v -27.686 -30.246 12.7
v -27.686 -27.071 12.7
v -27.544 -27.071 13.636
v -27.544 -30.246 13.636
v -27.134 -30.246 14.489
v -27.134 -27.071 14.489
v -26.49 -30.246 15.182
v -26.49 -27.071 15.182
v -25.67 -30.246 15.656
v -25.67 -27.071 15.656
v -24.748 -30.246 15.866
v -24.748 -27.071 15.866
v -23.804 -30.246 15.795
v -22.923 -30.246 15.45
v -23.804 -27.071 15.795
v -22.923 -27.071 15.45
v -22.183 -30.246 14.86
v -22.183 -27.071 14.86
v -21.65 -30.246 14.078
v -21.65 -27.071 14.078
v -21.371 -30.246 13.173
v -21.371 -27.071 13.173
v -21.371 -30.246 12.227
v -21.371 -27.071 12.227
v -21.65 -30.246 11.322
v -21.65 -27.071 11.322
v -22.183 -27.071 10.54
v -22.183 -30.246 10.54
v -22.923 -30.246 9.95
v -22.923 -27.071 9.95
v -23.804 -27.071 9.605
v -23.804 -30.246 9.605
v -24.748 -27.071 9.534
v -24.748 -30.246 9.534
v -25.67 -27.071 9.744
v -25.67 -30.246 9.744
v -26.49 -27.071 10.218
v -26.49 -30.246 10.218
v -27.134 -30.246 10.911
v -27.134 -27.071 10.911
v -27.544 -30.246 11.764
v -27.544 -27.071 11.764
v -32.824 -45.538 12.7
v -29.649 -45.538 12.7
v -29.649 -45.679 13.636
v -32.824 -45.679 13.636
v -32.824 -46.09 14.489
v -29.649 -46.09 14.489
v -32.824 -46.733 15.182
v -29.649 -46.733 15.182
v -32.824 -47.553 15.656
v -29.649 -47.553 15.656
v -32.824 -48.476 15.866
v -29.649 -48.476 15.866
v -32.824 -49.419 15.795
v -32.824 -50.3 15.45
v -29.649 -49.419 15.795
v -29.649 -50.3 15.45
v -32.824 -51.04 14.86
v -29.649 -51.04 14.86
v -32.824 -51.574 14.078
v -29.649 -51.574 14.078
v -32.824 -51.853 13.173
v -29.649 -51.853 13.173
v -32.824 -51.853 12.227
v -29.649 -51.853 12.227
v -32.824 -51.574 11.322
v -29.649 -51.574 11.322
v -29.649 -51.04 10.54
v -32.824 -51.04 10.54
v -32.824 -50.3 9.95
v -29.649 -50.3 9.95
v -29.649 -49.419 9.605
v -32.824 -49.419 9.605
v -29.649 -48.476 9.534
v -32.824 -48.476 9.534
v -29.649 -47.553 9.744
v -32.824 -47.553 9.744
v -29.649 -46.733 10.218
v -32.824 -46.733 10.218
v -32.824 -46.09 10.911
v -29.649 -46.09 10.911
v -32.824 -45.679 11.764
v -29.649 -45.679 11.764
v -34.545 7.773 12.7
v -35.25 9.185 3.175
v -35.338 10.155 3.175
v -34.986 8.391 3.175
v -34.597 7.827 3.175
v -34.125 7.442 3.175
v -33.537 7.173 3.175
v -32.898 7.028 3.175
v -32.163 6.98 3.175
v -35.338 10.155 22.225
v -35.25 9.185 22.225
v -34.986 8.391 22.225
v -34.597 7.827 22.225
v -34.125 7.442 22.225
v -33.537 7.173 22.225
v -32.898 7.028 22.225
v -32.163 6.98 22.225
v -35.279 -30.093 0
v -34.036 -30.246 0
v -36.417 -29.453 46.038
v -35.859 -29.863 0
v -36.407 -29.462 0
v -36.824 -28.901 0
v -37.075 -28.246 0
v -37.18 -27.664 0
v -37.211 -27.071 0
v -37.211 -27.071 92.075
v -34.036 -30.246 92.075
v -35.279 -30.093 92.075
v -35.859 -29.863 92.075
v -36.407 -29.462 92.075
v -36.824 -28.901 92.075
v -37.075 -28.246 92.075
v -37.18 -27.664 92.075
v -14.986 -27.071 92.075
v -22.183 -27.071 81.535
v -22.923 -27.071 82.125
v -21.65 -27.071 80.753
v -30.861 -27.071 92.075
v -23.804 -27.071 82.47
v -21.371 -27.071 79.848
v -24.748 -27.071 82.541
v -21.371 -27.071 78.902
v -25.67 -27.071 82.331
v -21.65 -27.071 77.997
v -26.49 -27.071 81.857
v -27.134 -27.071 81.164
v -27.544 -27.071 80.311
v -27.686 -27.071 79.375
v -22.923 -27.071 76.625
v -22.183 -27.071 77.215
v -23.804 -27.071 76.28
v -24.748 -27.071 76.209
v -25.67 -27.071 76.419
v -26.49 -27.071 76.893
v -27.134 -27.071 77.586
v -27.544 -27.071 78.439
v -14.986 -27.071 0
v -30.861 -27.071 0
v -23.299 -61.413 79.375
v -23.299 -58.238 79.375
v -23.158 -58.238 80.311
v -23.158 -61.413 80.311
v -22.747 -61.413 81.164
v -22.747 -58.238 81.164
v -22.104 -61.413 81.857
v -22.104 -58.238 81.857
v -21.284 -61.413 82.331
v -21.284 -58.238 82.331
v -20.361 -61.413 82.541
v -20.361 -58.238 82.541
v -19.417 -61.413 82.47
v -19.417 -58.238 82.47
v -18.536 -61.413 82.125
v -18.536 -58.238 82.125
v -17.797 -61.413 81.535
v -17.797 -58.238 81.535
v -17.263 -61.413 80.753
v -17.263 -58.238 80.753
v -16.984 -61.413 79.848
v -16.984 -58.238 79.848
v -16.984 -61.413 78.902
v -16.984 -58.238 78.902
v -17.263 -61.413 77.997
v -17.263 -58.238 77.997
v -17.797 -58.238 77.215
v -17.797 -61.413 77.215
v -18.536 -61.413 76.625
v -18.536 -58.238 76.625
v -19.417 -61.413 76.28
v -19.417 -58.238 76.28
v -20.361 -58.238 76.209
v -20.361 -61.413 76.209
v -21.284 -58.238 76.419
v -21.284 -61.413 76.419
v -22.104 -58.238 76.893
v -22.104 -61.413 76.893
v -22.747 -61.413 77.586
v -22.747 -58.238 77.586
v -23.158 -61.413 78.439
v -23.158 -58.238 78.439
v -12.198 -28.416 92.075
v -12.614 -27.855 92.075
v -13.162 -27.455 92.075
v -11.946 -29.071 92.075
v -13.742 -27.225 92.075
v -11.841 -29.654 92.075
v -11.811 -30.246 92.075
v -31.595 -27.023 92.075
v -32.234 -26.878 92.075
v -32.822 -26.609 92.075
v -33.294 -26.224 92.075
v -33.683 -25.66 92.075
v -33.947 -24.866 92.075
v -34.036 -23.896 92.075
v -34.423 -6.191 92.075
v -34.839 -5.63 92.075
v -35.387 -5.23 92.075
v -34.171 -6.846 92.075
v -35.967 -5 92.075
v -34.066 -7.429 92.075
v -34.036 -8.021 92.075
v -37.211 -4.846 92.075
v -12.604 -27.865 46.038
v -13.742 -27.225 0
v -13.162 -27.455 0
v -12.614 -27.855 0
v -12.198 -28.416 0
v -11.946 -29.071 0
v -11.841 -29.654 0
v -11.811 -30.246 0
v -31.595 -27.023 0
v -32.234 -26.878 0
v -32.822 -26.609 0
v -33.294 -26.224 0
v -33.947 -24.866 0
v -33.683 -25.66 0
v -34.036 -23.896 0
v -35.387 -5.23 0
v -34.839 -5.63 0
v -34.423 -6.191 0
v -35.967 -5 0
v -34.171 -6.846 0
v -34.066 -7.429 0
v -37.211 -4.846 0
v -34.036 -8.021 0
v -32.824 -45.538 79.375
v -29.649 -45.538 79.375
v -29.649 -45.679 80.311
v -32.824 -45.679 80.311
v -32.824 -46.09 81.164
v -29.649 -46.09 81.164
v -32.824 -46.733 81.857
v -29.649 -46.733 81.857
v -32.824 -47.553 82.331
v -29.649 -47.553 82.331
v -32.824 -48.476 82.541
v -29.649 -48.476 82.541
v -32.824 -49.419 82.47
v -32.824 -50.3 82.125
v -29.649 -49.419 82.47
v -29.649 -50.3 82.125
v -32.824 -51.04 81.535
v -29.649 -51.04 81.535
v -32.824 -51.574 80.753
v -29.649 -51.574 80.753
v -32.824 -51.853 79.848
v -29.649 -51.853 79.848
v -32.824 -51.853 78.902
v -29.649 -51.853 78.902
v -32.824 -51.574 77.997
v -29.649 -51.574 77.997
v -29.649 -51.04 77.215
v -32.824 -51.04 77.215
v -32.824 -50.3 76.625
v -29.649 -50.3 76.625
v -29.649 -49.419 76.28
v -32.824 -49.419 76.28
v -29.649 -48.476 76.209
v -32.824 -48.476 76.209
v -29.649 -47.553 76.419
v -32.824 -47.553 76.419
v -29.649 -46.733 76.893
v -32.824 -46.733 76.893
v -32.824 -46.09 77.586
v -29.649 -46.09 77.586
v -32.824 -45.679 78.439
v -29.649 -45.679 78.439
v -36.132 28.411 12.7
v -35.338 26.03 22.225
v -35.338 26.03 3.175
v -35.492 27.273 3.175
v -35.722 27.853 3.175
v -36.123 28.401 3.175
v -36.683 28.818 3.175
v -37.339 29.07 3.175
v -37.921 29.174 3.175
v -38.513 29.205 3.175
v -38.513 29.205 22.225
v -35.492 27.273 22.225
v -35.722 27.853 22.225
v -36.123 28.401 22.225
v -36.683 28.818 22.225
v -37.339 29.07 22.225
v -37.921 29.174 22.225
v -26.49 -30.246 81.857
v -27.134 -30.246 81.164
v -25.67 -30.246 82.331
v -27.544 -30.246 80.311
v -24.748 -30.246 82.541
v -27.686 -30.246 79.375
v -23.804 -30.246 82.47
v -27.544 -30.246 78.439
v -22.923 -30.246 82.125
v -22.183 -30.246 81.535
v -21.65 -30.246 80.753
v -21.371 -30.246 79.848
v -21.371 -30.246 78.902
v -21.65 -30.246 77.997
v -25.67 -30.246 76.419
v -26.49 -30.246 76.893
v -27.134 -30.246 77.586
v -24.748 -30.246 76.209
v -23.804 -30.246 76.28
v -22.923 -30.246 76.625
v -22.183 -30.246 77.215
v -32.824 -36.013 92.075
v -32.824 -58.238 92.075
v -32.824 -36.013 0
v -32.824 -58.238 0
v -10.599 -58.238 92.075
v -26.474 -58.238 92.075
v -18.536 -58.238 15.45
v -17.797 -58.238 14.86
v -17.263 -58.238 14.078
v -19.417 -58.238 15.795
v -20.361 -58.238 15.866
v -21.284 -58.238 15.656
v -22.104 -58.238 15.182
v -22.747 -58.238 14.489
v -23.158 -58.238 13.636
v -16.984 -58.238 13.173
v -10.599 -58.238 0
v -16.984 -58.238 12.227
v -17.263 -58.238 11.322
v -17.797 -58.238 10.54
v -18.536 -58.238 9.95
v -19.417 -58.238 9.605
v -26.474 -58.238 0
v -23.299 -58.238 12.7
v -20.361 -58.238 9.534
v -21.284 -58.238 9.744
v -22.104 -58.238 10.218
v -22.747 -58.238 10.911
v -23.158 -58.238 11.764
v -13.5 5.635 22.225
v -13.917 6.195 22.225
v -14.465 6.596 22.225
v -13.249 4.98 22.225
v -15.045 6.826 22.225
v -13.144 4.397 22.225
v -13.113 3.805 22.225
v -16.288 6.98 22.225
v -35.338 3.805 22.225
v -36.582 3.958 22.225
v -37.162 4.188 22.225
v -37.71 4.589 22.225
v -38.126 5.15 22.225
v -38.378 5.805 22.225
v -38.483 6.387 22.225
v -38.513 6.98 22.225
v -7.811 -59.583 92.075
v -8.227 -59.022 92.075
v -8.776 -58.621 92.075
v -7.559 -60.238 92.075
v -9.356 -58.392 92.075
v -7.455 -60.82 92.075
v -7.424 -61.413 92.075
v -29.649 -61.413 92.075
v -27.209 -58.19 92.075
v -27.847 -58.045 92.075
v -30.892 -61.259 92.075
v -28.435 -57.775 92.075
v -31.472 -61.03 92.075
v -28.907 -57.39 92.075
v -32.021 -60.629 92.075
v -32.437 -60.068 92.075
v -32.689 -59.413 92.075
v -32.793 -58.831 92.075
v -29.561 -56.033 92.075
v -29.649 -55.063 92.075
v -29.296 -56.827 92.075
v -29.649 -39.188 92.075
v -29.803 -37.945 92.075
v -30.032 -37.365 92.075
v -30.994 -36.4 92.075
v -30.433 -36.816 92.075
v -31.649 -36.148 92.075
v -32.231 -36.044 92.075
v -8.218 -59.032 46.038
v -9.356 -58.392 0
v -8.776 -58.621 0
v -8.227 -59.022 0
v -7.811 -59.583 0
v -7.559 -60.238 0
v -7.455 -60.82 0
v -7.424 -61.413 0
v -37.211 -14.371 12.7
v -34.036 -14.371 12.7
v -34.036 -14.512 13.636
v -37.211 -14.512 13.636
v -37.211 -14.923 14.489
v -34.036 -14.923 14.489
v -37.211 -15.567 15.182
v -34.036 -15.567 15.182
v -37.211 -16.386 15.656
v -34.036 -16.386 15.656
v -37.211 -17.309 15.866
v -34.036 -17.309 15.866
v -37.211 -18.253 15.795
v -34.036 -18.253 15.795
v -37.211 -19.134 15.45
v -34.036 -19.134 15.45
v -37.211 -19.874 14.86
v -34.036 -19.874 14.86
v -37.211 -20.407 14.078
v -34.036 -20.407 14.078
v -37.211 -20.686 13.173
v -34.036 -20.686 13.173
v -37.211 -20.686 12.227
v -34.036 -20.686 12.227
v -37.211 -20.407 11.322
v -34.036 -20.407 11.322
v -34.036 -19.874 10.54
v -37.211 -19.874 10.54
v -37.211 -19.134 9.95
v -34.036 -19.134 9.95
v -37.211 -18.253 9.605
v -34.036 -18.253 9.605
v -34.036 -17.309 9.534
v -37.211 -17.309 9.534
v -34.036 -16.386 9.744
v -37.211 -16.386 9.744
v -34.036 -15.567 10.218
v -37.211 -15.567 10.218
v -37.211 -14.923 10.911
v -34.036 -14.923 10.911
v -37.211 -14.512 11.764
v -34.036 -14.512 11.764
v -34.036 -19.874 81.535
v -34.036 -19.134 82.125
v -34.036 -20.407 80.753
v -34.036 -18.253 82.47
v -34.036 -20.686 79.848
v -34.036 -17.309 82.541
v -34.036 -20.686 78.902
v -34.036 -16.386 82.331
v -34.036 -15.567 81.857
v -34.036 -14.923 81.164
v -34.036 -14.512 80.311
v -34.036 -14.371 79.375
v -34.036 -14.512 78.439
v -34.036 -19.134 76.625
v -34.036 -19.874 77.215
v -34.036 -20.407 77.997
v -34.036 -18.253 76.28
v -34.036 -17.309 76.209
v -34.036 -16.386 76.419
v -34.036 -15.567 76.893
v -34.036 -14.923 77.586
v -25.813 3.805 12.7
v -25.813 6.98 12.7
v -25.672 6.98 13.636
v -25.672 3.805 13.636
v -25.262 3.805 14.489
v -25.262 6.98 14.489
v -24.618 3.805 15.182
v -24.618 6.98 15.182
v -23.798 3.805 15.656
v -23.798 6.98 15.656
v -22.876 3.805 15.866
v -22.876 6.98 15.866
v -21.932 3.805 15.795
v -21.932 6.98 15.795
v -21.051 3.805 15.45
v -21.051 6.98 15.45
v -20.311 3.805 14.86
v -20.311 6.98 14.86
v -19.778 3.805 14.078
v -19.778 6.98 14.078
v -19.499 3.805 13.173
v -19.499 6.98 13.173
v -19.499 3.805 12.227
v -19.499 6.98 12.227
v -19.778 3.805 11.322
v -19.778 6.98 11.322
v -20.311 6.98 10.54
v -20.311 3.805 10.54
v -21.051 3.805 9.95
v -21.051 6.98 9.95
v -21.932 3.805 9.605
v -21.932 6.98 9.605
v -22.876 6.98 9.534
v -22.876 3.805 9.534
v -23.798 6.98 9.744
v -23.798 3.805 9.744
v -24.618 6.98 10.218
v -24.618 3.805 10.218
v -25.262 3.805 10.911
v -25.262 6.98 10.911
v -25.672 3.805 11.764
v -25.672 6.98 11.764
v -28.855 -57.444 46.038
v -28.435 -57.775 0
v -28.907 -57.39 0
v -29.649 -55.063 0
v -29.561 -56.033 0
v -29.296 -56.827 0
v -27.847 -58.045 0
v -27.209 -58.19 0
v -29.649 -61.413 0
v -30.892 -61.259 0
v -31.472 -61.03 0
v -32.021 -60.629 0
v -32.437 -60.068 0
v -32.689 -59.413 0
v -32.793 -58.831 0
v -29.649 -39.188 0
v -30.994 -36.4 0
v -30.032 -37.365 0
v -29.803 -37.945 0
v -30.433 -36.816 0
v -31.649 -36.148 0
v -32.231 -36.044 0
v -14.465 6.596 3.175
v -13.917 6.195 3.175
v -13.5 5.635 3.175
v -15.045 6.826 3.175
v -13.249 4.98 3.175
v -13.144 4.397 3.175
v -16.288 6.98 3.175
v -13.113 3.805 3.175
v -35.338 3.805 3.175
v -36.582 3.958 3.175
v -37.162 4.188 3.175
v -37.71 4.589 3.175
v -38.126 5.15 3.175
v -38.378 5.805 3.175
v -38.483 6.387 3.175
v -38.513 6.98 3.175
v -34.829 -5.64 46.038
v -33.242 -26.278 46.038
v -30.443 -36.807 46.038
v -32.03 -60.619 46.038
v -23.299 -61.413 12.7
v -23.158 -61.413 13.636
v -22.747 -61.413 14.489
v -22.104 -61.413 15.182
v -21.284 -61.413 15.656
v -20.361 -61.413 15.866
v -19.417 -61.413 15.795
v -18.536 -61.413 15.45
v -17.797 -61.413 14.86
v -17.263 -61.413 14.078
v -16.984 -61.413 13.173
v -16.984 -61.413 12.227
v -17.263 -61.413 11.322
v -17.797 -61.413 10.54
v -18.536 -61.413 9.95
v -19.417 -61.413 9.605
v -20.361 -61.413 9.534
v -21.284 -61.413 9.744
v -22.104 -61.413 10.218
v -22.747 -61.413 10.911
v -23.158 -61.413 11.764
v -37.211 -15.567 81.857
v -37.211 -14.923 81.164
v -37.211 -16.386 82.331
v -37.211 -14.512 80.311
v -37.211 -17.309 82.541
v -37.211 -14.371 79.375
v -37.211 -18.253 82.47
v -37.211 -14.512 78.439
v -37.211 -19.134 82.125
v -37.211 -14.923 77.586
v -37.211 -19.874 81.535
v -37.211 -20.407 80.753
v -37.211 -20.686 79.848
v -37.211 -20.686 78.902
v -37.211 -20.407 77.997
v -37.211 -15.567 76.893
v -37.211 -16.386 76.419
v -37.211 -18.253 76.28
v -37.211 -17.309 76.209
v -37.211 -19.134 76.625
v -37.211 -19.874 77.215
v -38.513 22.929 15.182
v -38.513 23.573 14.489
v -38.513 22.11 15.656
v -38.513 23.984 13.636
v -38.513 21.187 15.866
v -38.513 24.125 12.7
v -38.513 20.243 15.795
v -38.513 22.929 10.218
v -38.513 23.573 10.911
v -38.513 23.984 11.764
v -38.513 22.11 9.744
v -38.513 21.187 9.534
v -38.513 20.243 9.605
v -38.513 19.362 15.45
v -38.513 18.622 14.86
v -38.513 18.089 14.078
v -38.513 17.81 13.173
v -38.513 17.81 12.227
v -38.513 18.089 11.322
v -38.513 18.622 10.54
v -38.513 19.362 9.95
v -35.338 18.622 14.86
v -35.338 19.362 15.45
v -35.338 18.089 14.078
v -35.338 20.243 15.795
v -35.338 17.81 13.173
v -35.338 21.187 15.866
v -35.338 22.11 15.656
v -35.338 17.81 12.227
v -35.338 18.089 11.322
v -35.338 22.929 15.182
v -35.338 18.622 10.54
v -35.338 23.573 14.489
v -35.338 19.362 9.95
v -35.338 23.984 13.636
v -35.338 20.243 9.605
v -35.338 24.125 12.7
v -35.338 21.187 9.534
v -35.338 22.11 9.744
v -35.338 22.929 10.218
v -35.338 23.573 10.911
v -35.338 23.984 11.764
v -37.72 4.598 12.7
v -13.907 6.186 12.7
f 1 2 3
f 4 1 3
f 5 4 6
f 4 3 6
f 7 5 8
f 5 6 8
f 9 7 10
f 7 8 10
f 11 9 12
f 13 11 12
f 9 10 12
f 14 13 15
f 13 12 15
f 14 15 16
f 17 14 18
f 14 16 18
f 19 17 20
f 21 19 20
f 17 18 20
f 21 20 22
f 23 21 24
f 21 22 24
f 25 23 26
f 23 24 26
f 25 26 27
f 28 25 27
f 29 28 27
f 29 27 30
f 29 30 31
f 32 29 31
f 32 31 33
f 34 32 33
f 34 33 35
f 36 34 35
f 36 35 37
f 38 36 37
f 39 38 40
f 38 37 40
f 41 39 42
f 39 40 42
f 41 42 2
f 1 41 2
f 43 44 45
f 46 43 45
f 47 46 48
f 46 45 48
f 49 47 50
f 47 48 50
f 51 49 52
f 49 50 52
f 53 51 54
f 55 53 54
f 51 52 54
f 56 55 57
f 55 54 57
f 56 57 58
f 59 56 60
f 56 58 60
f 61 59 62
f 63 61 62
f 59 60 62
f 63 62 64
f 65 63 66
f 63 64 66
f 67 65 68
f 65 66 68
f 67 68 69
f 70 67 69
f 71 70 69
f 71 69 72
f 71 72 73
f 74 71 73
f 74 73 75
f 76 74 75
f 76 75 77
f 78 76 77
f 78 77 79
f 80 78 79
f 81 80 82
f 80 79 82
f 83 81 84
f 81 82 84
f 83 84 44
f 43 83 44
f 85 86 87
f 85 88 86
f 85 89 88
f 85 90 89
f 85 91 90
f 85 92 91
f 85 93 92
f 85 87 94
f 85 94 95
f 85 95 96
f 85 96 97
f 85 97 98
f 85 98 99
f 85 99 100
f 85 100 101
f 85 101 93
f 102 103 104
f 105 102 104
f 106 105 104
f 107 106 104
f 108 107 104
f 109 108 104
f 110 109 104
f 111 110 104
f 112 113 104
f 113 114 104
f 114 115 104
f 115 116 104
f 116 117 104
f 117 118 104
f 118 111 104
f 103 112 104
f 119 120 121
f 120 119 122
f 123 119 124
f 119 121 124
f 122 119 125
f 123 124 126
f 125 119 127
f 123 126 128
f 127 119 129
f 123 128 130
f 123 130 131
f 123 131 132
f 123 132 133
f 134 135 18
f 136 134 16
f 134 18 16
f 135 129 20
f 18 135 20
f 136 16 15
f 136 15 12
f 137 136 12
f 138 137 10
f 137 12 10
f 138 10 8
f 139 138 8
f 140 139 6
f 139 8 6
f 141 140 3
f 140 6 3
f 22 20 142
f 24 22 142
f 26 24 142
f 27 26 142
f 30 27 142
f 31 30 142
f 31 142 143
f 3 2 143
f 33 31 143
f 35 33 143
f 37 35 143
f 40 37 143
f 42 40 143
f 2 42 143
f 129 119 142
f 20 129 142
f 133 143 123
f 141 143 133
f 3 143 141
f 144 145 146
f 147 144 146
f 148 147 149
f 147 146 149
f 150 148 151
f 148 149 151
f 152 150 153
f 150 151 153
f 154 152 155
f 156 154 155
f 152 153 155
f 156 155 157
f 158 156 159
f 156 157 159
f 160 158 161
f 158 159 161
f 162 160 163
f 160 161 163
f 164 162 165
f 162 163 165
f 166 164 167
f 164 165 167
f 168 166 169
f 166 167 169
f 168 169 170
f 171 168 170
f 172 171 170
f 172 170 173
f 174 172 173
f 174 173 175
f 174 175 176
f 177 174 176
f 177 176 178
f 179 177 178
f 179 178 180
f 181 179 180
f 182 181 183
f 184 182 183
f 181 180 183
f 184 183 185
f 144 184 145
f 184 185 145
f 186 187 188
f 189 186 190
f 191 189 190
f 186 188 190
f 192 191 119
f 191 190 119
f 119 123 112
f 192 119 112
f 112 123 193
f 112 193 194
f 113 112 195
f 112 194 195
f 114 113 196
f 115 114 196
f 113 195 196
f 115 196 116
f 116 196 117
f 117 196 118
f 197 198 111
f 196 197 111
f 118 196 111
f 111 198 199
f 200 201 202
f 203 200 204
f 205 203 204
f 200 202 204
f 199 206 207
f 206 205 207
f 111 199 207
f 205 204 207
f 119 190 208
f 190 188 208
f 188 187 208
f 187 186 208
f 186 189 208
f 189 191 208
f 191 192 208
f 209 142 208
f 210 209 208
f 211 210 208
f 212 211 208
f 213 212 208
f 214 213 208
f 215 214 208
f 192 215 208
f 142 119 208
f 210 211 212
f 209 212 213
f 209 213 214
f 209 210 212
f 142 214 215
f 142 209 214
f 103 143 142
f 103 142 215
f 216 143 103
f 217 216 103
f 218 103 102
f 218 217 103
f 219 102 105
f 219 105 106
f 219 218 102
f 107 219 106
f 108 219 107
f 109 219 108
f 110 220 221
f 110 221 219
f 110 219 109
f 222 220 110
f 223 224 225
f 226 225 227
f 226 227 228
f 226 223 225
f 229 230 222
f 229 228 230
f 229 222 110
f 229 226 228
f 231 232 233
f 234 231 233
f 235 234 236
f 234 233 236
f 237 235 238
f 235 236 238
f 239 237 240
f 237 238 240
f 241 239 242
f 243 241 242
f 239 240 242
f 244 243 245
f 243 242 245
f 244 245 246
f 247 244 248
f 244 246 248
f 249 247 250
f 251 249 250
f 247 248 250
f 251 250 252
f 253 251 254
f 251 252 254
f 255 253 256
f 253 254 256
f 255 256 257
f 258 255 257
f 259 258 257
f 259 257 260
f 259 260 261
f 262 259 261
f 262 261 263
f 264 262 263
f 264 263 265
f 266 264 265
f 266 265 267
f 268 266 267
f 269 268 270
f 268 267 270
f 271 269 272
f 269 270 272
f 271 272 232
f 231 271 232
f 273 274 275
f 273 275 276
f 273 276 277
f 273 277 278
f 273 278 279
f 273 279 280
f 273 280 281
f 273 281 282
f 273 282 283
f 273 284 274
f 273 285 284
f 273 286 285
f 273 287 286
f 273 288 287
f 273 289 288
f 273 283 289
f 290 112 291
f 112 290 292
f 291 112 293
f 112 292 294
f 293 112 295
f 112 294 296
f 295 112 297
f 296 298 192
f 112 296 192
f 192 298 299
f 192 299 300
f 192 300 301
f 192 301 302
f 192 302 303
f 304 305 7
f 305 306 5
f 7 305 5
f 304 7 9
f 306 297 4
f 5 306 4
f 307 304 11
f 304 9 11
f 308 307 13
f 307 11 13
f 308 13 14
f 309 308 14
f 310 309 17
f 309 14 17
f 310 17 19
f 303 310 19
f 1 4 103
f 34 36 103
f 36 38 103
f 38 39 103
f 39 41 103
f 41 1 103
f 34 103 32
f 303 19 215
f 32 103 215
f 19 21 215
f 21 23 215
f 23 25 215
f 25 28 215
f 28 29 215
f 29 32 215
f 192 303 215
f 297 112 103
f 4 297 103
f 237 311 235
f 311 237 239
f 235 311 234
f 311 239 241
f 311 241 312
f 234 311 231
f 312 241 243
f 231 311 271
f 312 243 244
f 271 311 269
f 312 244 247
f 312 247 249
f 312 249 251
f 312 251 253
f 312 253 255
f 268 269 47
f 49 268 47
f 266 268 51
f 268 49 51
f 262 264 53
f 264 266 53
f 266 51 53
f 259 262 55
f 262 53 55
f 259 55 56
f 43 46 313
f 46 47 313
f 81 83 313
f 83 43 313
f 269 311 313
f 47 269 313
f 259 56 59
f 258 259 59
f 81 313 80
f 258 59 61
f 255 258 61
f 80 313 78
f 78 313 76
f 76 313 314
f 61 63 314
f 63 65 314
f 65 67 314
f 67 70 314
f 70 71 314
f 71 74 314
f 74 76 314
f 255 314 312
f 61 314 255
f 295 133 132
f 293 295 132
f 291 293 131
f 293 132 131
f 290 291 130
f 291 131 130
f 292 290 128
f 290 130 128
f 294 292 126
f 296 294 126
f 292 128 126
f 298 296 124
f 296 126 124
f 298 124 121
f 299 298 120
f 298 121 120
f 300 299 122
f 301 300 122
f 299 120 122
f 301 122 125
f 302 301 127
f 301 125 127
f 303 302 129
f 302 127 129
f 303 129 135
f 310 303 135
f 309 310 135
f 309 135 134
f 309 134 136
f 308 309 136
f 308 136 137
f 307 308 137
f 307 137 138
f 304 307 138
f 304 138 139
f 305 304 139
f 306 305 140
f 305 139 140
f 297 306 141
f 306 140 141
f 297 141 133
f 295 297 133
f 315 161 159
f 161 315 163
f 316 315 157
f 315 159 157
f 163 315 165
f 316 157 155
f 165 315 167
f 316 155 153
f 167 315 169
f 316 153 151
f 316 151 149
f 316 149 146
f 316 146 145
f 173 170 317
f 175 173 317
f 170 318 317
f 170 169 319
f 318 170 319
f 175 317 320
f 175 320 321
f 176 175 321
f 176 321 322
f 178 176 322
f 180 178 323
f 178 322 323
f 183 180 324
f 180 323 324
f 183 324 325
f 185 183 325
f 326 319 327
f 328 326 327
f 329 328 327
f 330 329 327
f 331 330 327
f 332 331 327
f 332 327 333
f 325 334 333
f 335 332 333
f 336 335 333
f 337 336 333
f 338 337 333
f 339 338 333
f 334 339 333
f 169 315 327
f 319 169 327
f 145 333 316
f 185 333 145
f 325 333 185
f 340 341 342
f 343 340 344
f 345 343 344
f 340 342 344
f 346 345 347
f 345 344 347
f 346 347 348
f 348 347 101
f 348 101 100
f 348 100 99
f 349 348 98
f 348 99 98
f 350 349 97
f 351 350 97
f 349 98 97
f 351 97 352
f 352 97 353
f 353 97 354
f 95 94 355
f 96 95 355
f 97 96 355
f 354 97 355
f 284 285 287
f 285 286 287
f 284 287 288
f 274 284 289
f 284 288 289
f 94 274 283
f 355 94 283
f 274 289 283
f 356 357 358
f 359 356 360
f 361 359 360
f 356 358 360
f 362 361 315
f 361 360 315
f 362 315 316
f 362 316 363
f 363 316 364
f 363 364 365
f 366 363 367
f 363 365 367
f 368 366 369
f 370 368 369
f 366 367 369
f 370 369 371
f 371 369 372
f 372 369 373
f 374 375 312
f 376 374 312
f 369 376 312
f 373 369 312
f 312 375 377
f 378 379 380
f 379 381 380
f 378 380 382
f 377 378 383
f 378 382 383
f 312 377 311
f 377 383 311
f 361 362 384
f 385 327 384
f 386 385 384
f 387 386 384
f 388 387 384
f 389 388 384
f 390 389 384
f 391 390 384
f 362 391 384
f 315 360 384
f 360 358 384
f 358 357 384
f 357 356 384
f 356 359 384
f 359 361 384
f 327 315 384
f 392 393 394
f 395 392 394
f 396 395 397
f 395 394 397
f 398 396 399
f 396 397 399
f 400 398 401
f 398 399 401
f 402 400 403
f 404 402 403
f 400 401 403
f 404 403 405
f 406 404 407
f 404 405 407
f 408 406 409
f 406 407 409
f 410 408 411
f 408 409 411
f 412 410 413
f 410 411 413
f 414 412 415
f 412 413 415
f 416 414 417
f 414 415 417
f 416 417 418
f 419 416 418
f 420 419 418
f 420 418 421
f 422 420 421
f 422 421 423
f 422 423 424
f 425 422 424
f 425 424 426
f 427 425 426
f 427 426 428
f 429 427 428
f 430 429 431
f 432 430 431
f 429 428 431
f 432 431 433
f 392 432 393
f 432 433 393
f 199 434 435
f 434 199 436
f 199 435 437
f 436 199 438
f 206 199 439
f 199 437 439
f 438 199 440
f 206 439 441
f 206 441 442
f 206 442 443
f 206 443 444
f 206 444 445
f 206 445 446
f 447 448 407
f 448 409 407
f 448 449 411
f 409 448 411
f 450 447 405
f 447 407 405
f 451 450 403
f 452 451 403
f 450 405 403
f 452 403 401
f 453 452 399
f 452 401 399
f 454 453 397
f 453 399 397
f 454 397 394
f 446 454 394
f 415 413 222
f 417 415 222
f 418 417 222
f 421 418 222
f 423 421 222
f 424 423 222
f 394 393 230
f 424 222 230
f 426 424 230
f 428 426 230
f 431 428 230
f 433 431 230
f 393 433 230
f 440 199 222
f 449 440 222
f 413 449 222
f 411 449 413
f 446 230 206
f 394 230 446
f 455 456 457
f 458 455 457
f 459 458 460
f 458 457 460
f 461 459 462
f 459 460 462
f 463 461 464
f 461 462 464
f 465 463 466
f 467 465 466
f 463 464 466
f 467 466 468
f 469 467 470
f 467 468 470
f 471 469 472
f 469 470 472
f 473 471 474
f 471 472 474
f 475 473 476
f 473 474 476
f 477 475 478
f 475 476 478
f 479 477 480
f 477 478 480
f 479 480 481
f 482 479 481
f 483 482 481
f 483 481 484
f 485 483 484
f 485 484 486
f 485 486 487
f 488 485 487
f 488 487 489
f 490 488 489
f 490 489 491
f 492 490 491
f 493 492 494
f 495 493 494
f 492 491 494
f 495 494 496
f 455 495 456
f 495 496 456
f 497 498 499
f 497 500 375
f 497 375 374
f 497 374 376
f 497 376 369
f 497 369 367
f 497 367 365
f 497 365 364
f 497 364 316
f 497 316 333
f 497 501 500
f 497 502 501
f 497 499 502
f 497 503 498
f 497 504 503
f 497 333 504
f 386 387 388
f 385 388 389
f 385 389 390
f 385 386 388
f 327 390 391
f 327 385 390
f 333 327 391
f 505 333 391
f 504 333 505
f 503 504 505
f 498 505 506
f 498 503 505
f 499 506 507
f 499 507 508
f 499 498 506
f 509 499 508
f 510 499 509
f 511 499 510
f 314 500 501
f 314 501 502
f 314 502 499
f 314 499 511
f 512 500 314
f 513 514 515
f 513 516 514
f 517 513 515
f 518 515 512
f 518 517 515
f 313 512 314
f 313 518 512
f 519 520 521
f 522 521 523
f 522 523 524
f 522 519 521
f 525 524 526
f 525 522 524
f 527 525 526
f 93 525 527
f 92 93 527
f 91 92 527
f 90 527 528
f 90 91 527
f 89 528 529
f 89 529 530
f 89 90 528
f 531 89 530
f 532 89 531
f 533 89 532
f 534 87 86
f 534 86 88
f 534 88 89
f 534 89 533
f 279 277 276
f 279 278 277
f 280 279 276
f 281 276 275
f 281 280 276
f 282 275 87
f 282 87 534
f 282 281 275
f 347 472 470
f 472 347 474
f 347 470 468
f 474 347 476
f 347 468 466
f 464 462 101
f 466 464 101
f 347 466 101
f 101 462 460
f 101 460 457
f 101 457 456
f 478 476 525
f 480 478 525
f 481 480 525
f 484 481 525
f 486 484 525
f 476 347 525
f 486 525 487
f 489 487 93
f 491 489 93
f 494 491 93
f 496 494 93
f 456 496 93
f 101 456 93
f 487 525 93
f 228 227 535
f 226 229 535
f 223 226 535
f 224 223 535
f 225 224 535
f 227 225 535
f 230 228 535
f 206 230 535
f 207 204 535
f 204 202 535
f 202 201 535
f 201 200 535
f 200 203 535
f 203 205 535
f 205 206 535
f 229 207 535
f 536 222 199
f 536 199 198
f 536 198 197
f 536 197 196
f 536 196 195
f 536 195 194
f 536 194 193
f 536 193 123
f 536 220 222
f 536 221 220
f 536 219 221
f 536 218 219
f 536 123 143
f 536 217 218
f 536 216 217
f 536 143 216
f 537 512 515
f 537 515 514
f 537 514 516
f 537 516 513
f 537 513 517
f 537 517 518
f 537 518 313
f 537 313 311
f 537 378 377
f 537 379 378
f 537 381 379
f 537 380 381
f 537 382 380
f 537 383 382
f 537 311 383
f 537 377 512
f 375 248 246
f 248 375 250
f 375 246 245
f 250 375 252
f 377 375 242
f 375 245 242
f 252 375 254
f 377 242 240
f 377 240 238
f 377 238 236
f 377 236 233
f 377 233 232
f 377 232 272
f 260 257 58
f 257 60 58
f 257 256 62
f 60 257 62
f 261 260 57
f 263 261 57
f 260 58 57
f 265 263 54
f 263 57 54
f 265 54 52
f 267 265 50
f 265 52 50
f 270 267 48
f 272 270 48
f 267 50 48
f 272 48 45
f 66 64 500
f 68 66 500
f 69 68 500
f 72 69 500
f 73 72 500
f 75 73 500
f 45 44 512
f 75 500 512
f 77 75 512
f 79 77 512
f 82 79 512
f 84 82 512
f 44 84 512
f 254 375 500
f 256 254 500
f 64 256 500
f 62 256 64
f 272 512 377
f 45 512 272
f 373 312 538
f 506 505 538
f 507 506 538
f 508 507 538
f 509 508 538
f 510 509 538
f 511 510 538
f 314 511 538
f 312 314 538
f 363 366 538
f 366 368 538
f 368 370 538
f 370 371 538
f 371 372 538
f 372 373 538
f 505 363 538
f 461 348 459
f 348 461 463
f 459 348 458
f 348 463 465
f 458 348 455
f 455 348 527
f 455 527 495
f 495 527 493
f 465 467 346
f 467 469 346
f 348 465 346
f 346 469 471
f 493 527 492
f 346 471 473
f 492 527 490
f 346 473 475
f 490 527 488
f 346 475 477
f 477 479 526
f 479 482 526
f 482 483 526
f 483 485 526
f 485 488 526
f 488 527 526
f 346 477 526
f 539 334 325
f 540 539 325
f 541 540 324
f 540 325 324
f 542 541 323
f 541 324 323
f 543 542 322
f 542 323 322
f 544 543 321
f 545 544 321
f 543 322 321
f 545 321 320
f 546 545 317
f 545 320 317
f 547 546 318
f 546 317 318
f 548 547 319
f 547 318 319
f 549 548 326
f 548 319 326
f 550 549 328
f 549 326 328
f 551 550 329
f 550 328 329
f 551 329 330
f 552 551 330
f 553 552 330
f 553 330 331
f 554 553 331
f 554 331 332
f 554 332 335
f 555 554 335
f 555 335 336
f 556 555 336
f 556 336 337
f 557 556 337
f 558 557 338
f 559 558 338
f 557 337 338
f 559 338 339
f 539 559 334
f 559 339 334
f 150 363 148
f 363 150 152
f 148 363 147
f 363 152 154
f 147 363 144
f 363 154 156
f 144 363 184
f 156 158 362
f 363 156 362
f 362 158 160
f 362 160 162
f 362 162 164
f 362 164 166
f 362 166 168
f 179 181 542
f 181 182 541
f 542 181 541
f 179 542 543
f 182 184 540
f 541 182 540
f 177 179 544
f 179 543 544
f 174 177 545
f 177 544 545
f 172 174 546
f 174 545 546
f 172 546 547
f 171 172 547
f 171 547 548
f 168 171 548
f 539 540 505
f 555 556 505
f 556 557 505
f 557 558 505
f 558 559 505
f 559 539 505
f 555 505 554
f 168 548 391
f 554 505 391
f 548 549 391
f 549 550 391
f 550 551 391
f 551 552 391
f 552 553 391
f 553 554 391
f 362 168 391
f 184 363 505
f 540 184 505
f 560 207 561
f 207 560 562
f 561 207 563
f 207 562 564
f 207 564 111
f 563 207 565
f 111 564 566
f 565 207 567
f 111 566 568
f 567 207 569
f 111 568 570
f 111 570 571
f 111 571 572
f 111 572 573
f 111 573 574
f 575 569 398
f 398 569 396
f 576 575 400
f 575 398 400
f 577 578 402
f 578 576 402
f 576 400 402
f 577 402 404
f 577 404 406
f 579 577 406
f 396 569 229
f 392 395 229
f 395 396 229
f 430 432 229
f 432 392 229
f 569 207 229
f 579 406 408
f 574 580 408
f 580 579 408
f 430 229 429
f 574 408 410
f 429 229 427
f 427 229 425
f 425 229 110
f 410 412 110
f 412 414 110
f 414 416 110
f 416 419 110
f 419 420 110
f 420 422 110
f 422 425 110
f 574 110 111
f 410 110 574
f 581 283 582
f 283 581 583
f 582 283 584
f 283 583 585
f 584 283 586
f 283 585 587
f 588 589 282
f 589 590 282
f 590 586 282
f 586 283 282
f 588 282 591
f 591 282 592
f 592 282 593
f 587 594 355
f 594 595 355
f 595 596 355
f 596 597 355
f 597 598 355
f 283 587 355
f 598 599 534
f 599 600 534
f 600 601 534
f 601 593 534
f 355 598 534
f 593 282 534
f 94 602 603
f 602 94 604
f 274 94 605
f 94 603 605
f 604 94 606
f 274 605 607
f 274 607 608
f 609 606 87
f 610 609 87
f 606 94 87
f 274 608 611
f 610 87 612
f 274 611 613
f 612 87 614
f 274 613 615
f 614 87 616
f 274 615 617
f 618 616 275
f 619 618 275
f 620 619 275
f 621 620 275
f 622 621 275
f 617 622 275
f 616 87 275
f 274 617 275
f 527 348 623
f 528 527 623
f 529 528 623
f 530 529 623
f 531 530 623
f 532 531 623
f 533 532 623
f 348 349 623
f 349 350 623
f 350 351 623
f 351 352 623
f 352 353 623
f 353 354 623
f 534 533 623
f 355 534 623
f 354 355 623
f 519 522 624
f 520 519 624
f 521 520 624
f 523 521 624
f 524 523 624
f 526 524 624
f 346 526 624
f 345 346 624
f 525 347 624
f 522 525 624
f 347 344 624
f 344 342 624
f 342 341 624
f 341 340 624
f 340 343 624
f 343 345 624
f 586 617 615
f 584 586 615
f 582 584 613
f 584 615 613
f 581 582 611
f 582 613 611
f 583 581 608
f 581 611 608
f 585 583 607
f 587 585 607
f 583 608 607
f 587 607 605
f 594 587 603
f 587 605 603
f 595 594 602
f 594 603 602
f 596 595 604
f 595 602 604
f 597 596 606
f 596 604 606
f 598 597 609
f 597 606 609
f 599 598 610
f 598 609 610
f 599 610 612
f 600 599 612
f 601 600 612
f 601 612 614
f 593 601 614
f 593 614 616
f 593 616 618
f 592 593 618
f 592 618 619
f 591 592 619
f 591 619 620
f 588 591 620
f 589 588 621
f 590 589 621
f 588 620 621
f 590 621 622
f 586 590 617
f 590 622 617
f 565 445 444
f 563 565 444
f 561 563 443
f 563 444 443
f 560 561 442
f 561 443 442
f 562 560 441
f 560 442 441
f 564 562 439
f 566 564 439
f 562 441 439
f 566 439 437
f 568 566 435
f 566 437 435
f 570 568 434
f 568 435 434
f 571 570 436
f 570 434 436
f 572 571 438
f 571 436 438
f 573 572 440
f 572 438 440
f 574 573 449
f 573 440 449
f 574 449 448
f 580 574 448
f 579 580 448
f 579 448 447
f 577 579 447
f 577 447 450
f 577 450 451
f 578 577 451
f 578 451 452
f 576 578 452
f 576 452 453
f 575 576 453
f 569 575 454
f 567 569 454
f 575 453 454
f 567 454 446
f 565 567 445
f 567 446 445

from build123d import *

# Parameters (mm, degrees)
F1_DEPTH       = 25.4
F3_DEPTH       = 92.075
F7_R           = 3.175
F9_DEPTH       = 3.175
F8_R           = 3.175
F10_DEPTH      = 3.175
F11_R          = 3.175
F13_DEPTH      = 3.175
F12_R          = 3.175
F14_DEPTH      = 3.175
F6_R           = 3.175
F15_DEPTH      = 3.175
F16_R          = 3.175
F17_DEPTH      = 3.175
F18_T1_DEPTH   = 92.075
F18_T3_DEPTH   = 107.95
F18_2_T1_DEPTH = 25.4
F18_2_T3_DEPTH = 41.275
F18_3_T1_DEPTH = 92.075
F18_3_T3_DEPTH = 107.95
F19_DEPTH      = 1.5875
F20_DEPTH      = 1.5875
F21_DEPTH      = 1.5875
F22_DEPTH      = 1.5875


# Not quite as in the source:
# - a fillet or chamfer that OpenCascade refuses, or shapes differently, is made with other operations: its cross-section is extruded or revolved along the edge and cut away or added


with BuildPart() as f1:
    # F0 (on Top) → F1 (new body)
    with BuildSketch(Plane.XY):
        Polygon((-35.3384790047, 29.2046858582), (-38.5134790047, 29.2046858582), (-38.5134790047, 3.8046858582), (-13.1134790047, 3.8046858582), (-13.1134790047, 6.9796858582), (-35.3384790047, 6.9796858582), align=None)
    extrude(amount=F1_DEPTH)

    # F6 (on face) → F15 (cut)
    with BuildSketch(Plane.YZ.offset(-35.3384790047)):
        with Locations((20.9496858582, 12.7)):
            Circle(F6_R)
    extrude(amount=-F15_DEPTH, mode=Mode.SUBTRACT)

    # F16 (on face) → F17 (cut)
    with BuildSketch(Plane(origin=(0, 6.9796858582, 0), x_dir=(-1, 0, 0), z_dir=(0, 1, 0))):
        with Locations((22.6384790047, 12.7)):
            Circle(F16_R)
    extrude(amount=-F17_DEPTH, mode=Mode.SUBTRACT)

    # F18#2: fillet of radius 3.175 on 4 edges, made by hand

    # F18_2_s2 → F18_2_t1 (join)
    with BuildSketch(Plane.XY):
        with BuildLine():
            add(Edge.make_bspline(
                [(-35.3384790047, 10.1546858582), (-35.3384790047, 6.9796858582), (-32.1634790047, 6.9796858582)],
                knots=[0, 0, 0, 1, 1, 1], degree=2, weights=[1, 1, 1]))
            Line((-32.1634790047, 6.9796858582), (-35.3384790047, 6.9796858582))
            Line((-35.3384790047, 6.9796858582), (-35.3384790047, 10.1546858582))
        make_face()
    extrude(amount=F18_2_T1_DEPTH)

    # F18_2_s4 → F18_2_t3 (cut)
    with BuildSketch(Plane.XY.offset(-7.9375)):
        with BuildLine():
            add(Edge.make_bspline(
                [(-38.5134790047, 6.9796858582), (-38.5134790047, 3.8046858582), (-35.3384790047, 3.8046858582)],
                knots=[0, 0, 0, 1, 1, 1], degree=2, weights=[1, 1, 1]))
            Line((-35.3384790047, 3.8046858582), (-38.5134790047, 3.8046858582))
            Line((-38.5134790047, 3.8046858582), (-38.5134790047, 6.9796858582))
        make_face()
        with BuildLine():
            add(Edge.make_bspline(
                [(-13.1134790047, 3.8046858582), (-13.1134790047, 6.9796858582), (-16.2884790047, 6.9796858582)],
                knots=[0, 0, 0, 1, 1, 1], degree=2, weights=[1, 1, 1]))
            Line((-16.2884790047, 6.9796858582), (-13.1134790047, 6.9796858582))
            Line((-13.1134790047, 6.9796858582), (-13.1134790047, 3.8046858582))
        make_face()
        with BuildLine():
            add(Edge.make_bspline(
                [(-38.5134790047, 29.2046858582), (-35.3384790047, 29.2046858582), (-35.3384790047, 26.0296858582)],
                knots=[0, 0, 0, 1, 1, 1], degree=2, weights=[1, 1, 1]))
            Line((-35.3384790047, 26.0296858582), (-35.3384790047, 29.2046858582))
            Line((-35.3384790047, 29.2046858582), (-38.5134790047, 29.2046858582))
        make_face()
    extrude(amount=F18_2_T3_DEPTH, mode=Mode.SUBTRACT)

    # F19 (cut): a face of the model
    f19_faces = [f1.faces().sort_by_distance(p)[0] for p in [
        (-36.3862356489, 28.1569424984, 0),
    ]]
    extrude(f19_faces, amount=-F19_DEPTH, mode=Mode.SUBTRACT)

    # F20 (cut): a face of the model
    f20_faces = [f1.faces().sort_by_distance(p)[0] for p in [
        (-36.3862356489, 28.1569424984, 25.4),
    ]]
    extrude(f20_faces, amount=-F20_DEPTH, mode=Mode.SUBTRACT)

    # F21 (cut): a face of the model
    f21_faces = [f1.faces().sort_by_distance(p)[0] for p in [
        (-36.3862356489, 28.1569424984, 1.5875),
    ]]
    extrude(f21_faces, amount=-F21_DEPTH, mode=Mode.SUBTRACT)

    # F22 (cut): a face of the model
    f22_faces = [f1.faces().sort_by_distance(p)[0] for p in [
        (-36.3862356489, 28.1569424984, 23.8125),
    ]]
    extrude(f22_faces, amount=-F22_DEPTH, mode=Mode.SUBTRACT)


with BuildPart() as f3:
    # F0 (on Top) → F3 (new body)
    with BuildSketch(Plane.XY):
        Polygon((4.3401528042, 29.2046858582), (4.3401528042, 3.8046858582), (29.7401528042, 3.8046858582), (29.7401528042, 6.9796858582), (7.5151528042, 6.9796858582), (7.5151528042, 29.2046858582), align=None)
    extrude(amount=F3_DEPTH)


with BuildPart() as f3b:
    # F2 (on Top) → F3, piece 2 (new body)
    with BuildSketch(Plane.XY):
        Polygon((-37.2105298044, -4.8463200888), (-37.2105298044, -30.2463200888), (-11.8105298044, -30.2463200888), (-11.8105298044, -27.0713200888), (-34.0355298044, -27.0713200888), (-34.0355298044, -4.8463200888), align=None)
    extrude(amount=F3_DEPTH)

    # F8 (on face) → F10 (cut)
    with BuildSketch(Plane(origin=(0, -27.0713200888, 0), x_dir=(-1, 0, 0), z_dir=(0, 1, 0))):
        with Locations((24.5105298044, 79.375)):
            Circle(F8_R)
        with Locations((24.5105298044, 12.7)):
            Circle(F8_R)
    extrude(amount=-F10_DEPTH, mode=Mode.SUBTRACT)

    # F12 (on face) → F14 (cut)
    with BuildSketch(Plane.YZ.offset(-34.0355298044)):
        with Locations((-17.5463200888, 79.375)):
            Circle(F12_R)
        with Locations((-17.5463200888, 12.7)):
            Circle(F12_R)
    extrude(amount=-F14_DEPTH, mode=Mode.SUBTRACT)

    # F18: fillet of radius 3.175 on 4 edges, made by hand

    # F18_s2 → F18_t1 (join)
    with BuildSketch(Plane.XY):
        with BuildLine():
            add(Edge.make_bspline(
                [(-34.0355298044, -23.8963200888), (-34.0355298044, -27.0713200888), (-30.8605298044, -27.0713200888)],
                knots=[0, 0, 0, 1, 1, 1], degree=2, weights=[1, 1, 1]))
            Line((-30.8605298044, -27.0713200888), (-34.0355298044, -27.0713200888))
            Line((-34.0355298044, -27.0713200888), (-34.0355298044, -23.8963200888))
        make_face()
    extrude(amount=F18_T1_DEPTH)

    # F18_s4 → F18_t3 (cut)
    with BuildSketch(Plane.XY.offset(-7.9375)):
        with BuildLine():
            add(Edge.make_bspline(
                [(-37.2105298044, -27.0713200888), (-37.2105298044, -30.2463200888), (-34.0355298044, -30.2463200888)],
                knots=[0, 0, 0, 1, 1, 1], degree=2, weights=[1, 1, 1]))
            Line((-34.0355298044, -30.2463200888), (-37.2105298044, -30.2463200888))
            Line((-37.2105298044, -30.2463200888), (-37.2105298044, -27.0713200888))
        make_face()
        with BuildLine():
            add(Edge.make_bspline(
                [(-11.8105298044, -30.2463200888), (-11.8105298044, -27.0713200888), (-14.9855298044, -27.0713200888)],
                knots=[0, 0, 0, 1, 1, 1], degree=2, weights=[1, 1, 1]))
            Line((-14.9855298044, -27.0713200888), (-11.8105298044, -27.0713200888))
            Line((-11.8105298044, -27.0713200888), (-11.8105298044, -30.2463200888))
        make_face()
        with BuildLine():
            add(Edge.make_bspline(
                [(-34.0355298044, -8.0213200888), (-34.0355298044, -4.8463200888), (-37.2105298044, -4.8463200888)],
                knots=[0, 0, 0, 1, 1, 1], degree=2, weights=[1, 1, 1]))
            Line((-37.2105298044, -4.8463200888), (-34.0355298044, -4.8463200888))
            Line((-34.0355298044, -4.8463200888), (-34.0355298044, -8.0213200888))
        make_face()
    extrude(amount=F18_T3_DEPTH, mode=Mode.SUBTRACT)


with BuildPart() as f3c:
    # F2 (on Top) → F3, piece 3 (new body)
    with BuildSketch(Plane.XY):
        Polygon((-7.4239719417, -4.8463200888), (-7.4239719417, -30.2463200888), (17.9760280583, -30.2463200888), (17.9760280583, -27.0713200888), (-4.2489719417, -27.0713200888), (-4.2489719417, -4.8463200888), align=None)
    extrude(amount=F3_DEPTH)


with BuildPart() as f3d:
    # F2 (on Top) → F3, piece 4 (new body)
    with BuildSketch(Plane.XY):
        Polygon((-32.8239719417, -36.0129921032), (-32.8239719417, -61.4129921032), (-7.4239719417, -61.4129921032), (-7.4239719417, -58.2379921032), (-29.6489719417, -58.2379921032), (-29.6489719417, -36.0129921032), align=None)
    extrude(amount=F3_DEPTH)

    # F7 (on face) → F9 (cut)
    with BuildSketch(Plane(origin=(0, -58.2379921032, 0), x_dir=(-1, 0, 0), z_dir=(0, 1, 0))):
        with Locations((20.1239719417, 79.375)):
            Circle(F7_R)
        with Locations((20.1239719417, 12.7)):
            Circle(F7_R)
    extrude(amount=-F9_DEPTH, mode=Mode.SUBTRACT)

    # F11 (on face) → F13 (cut)
    with BuildSketch(Plane.YZ.offset(-29.6489719417)):
        with Locations((-48.7129921032, 79.375)):
            Circle(F11_R)
        with Locations((-48.7129921032, 12.7)):
            Circle(F11_R)
    extrude(amount=-F13_DEPTH, mode=Mode.SUBTRACT)

    # F18#3: fillet of radius 3.175 on 4 edges, made by hand

    # F18_3_s2 → F18_3_t1 (join)
    with BuildSketch(Plane.XY):
        with BuildLine():
            add(Edge.make_bspline(
                [(-29.6489719417, -55.0629921032), (-29.6489719417, -58.2379921032), (-26.4739719417, -58.2379921032)],
                knots=[0, 0, 0, 1, 1, 1], degree=2, weights=[1, 1, 1]))
            Line((-26.4739719417, -58.2379921032), (-29.6489719417, -58.2379921032))
            Line((-29.6489719417, -58.2379921032), (-29.6489719417, -55.0629921032))
        make_face()
    extrude(amount=F18_3_T1_DEPTH)

    # F18_3_s4 → F18_3_t3 (cut)
    with BuildSketch(Plane.XY.offset(-7.9375)):
        with BuildLine():
            add(Edge.make_bspline(
                [(-32.8239719417, -58.2379921032), (-32.8239719417, -61.4129921032), (-29.6489719417, -61.4129921032)],
                knots=[0, 0, 0, 1, 1, 1], degree=2, weights=[1, 1, 1]))
            Line((-29.6489719417, -61.4129921032), (-32.8239719417, -61.4129921032))
            Line((-32.8239719417, -61.4129921032), (-32.8239719417, -58.2379921032))
        make_face()
        with BuildLine():
            add(Edge.make_bspline(
                [(-7.4239719417, -61.4129921032), (-7.4239719417, -58.2379921032), (-10.5989719417, -58.2379921032)],
                knots=[0, 0, 0, 1, 1, 1], degree=2, weights=[1, 1, 1]))
            Line((-10.5989719417, -58.2379921032), (-7.4239719417, -58.2379921032))
            Line((-7.4239719417, -58.2379921032), (-7.4239719417, -61.4129921032))
        make_face()
        with BuildLine():
            add(Edge.make_bspline(
                [(-32.8239719417, -36.0129921032), (-29.6489719417, -36.0129921032), (-29.6489719417, -39.1879921032)],
                knots=[0, 0, 0, 1, 1, 1], degree=2, weights=[1, 1, 1]))
            Line((-29.6489719417, -39.1879921032), (-29.6489719417, -36.0129921032))
            Line((-29.6489719417, -36.0129921032), (-32.8239719417, -36.0129921032))
        make_face()
    extrude(amount=F18_3_T3_DEPTH, mode=Mode.SUBTRACT)


solid = Compound([f1.part, f3b.part, f3d.part])
